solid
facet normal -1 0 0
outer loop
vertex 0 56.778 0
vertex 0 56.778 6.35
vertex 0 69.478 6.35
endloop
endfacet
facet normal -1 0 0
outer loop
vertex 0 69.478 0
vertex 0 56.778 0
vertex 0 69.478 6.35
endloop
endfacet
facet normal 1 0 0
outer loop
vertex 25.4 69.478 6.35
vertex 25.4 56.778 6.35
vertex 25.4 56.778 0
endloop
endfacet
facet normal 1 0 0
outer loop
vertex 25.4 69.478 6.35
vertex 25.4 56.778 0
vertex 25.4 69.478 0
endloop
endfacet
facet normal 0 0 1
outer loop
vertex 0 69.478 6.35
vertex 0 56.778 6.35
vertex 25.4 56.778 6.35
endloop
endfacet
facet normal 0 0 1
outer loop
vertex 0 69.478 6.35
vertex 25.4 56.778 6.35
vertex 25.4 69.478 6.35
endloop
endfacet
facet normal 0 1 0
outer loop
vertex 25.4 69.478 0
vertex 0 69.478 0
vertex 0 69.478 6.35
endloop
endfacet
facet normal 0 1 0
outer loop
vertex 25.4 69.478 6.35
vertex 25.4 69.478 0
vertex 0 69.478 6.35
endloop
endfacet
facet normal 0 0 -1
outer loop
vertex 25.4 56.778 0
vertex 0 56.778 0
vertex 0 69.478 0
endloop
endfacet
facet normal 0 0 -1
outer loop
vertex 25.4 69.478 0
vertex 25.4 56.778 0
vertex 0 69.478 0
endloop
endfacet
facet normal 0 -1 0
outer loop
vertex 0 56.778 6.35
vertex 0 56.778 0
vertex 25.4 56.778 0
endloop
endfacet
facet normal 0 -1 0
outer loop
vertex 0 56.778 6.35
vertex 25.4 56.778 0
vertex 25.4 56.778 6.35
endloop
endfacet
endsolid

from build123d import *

# Parameters (mm, degrees)
F0_W     = 203.2
F0_H     = 101.6
F1_DEPTH = 50.8
F2_W     = 12.7
F2_H     = 6.35
F4_DEPTH = 25.4


with BuildPart() as f1:
    # F0 (on Top) → F1 (new body)
    with BuildSketch(Plane.XY):
        with Locations((10.0498665416, 18.56304156)):
            Rectangle(F0_W, F0_H)
    extrude(amount=F1_DEPTH)


with BuildPart() as f4:
    # F2 (on Right) → F4 (new body)
    with BuildSketch(Plane.YZ):
        with Locations((63.1279280245, 3.175)):
            Rectangle(F2_W, F2_H)
    extrude(amount=F4_DEPTH)


solid = f4.part
